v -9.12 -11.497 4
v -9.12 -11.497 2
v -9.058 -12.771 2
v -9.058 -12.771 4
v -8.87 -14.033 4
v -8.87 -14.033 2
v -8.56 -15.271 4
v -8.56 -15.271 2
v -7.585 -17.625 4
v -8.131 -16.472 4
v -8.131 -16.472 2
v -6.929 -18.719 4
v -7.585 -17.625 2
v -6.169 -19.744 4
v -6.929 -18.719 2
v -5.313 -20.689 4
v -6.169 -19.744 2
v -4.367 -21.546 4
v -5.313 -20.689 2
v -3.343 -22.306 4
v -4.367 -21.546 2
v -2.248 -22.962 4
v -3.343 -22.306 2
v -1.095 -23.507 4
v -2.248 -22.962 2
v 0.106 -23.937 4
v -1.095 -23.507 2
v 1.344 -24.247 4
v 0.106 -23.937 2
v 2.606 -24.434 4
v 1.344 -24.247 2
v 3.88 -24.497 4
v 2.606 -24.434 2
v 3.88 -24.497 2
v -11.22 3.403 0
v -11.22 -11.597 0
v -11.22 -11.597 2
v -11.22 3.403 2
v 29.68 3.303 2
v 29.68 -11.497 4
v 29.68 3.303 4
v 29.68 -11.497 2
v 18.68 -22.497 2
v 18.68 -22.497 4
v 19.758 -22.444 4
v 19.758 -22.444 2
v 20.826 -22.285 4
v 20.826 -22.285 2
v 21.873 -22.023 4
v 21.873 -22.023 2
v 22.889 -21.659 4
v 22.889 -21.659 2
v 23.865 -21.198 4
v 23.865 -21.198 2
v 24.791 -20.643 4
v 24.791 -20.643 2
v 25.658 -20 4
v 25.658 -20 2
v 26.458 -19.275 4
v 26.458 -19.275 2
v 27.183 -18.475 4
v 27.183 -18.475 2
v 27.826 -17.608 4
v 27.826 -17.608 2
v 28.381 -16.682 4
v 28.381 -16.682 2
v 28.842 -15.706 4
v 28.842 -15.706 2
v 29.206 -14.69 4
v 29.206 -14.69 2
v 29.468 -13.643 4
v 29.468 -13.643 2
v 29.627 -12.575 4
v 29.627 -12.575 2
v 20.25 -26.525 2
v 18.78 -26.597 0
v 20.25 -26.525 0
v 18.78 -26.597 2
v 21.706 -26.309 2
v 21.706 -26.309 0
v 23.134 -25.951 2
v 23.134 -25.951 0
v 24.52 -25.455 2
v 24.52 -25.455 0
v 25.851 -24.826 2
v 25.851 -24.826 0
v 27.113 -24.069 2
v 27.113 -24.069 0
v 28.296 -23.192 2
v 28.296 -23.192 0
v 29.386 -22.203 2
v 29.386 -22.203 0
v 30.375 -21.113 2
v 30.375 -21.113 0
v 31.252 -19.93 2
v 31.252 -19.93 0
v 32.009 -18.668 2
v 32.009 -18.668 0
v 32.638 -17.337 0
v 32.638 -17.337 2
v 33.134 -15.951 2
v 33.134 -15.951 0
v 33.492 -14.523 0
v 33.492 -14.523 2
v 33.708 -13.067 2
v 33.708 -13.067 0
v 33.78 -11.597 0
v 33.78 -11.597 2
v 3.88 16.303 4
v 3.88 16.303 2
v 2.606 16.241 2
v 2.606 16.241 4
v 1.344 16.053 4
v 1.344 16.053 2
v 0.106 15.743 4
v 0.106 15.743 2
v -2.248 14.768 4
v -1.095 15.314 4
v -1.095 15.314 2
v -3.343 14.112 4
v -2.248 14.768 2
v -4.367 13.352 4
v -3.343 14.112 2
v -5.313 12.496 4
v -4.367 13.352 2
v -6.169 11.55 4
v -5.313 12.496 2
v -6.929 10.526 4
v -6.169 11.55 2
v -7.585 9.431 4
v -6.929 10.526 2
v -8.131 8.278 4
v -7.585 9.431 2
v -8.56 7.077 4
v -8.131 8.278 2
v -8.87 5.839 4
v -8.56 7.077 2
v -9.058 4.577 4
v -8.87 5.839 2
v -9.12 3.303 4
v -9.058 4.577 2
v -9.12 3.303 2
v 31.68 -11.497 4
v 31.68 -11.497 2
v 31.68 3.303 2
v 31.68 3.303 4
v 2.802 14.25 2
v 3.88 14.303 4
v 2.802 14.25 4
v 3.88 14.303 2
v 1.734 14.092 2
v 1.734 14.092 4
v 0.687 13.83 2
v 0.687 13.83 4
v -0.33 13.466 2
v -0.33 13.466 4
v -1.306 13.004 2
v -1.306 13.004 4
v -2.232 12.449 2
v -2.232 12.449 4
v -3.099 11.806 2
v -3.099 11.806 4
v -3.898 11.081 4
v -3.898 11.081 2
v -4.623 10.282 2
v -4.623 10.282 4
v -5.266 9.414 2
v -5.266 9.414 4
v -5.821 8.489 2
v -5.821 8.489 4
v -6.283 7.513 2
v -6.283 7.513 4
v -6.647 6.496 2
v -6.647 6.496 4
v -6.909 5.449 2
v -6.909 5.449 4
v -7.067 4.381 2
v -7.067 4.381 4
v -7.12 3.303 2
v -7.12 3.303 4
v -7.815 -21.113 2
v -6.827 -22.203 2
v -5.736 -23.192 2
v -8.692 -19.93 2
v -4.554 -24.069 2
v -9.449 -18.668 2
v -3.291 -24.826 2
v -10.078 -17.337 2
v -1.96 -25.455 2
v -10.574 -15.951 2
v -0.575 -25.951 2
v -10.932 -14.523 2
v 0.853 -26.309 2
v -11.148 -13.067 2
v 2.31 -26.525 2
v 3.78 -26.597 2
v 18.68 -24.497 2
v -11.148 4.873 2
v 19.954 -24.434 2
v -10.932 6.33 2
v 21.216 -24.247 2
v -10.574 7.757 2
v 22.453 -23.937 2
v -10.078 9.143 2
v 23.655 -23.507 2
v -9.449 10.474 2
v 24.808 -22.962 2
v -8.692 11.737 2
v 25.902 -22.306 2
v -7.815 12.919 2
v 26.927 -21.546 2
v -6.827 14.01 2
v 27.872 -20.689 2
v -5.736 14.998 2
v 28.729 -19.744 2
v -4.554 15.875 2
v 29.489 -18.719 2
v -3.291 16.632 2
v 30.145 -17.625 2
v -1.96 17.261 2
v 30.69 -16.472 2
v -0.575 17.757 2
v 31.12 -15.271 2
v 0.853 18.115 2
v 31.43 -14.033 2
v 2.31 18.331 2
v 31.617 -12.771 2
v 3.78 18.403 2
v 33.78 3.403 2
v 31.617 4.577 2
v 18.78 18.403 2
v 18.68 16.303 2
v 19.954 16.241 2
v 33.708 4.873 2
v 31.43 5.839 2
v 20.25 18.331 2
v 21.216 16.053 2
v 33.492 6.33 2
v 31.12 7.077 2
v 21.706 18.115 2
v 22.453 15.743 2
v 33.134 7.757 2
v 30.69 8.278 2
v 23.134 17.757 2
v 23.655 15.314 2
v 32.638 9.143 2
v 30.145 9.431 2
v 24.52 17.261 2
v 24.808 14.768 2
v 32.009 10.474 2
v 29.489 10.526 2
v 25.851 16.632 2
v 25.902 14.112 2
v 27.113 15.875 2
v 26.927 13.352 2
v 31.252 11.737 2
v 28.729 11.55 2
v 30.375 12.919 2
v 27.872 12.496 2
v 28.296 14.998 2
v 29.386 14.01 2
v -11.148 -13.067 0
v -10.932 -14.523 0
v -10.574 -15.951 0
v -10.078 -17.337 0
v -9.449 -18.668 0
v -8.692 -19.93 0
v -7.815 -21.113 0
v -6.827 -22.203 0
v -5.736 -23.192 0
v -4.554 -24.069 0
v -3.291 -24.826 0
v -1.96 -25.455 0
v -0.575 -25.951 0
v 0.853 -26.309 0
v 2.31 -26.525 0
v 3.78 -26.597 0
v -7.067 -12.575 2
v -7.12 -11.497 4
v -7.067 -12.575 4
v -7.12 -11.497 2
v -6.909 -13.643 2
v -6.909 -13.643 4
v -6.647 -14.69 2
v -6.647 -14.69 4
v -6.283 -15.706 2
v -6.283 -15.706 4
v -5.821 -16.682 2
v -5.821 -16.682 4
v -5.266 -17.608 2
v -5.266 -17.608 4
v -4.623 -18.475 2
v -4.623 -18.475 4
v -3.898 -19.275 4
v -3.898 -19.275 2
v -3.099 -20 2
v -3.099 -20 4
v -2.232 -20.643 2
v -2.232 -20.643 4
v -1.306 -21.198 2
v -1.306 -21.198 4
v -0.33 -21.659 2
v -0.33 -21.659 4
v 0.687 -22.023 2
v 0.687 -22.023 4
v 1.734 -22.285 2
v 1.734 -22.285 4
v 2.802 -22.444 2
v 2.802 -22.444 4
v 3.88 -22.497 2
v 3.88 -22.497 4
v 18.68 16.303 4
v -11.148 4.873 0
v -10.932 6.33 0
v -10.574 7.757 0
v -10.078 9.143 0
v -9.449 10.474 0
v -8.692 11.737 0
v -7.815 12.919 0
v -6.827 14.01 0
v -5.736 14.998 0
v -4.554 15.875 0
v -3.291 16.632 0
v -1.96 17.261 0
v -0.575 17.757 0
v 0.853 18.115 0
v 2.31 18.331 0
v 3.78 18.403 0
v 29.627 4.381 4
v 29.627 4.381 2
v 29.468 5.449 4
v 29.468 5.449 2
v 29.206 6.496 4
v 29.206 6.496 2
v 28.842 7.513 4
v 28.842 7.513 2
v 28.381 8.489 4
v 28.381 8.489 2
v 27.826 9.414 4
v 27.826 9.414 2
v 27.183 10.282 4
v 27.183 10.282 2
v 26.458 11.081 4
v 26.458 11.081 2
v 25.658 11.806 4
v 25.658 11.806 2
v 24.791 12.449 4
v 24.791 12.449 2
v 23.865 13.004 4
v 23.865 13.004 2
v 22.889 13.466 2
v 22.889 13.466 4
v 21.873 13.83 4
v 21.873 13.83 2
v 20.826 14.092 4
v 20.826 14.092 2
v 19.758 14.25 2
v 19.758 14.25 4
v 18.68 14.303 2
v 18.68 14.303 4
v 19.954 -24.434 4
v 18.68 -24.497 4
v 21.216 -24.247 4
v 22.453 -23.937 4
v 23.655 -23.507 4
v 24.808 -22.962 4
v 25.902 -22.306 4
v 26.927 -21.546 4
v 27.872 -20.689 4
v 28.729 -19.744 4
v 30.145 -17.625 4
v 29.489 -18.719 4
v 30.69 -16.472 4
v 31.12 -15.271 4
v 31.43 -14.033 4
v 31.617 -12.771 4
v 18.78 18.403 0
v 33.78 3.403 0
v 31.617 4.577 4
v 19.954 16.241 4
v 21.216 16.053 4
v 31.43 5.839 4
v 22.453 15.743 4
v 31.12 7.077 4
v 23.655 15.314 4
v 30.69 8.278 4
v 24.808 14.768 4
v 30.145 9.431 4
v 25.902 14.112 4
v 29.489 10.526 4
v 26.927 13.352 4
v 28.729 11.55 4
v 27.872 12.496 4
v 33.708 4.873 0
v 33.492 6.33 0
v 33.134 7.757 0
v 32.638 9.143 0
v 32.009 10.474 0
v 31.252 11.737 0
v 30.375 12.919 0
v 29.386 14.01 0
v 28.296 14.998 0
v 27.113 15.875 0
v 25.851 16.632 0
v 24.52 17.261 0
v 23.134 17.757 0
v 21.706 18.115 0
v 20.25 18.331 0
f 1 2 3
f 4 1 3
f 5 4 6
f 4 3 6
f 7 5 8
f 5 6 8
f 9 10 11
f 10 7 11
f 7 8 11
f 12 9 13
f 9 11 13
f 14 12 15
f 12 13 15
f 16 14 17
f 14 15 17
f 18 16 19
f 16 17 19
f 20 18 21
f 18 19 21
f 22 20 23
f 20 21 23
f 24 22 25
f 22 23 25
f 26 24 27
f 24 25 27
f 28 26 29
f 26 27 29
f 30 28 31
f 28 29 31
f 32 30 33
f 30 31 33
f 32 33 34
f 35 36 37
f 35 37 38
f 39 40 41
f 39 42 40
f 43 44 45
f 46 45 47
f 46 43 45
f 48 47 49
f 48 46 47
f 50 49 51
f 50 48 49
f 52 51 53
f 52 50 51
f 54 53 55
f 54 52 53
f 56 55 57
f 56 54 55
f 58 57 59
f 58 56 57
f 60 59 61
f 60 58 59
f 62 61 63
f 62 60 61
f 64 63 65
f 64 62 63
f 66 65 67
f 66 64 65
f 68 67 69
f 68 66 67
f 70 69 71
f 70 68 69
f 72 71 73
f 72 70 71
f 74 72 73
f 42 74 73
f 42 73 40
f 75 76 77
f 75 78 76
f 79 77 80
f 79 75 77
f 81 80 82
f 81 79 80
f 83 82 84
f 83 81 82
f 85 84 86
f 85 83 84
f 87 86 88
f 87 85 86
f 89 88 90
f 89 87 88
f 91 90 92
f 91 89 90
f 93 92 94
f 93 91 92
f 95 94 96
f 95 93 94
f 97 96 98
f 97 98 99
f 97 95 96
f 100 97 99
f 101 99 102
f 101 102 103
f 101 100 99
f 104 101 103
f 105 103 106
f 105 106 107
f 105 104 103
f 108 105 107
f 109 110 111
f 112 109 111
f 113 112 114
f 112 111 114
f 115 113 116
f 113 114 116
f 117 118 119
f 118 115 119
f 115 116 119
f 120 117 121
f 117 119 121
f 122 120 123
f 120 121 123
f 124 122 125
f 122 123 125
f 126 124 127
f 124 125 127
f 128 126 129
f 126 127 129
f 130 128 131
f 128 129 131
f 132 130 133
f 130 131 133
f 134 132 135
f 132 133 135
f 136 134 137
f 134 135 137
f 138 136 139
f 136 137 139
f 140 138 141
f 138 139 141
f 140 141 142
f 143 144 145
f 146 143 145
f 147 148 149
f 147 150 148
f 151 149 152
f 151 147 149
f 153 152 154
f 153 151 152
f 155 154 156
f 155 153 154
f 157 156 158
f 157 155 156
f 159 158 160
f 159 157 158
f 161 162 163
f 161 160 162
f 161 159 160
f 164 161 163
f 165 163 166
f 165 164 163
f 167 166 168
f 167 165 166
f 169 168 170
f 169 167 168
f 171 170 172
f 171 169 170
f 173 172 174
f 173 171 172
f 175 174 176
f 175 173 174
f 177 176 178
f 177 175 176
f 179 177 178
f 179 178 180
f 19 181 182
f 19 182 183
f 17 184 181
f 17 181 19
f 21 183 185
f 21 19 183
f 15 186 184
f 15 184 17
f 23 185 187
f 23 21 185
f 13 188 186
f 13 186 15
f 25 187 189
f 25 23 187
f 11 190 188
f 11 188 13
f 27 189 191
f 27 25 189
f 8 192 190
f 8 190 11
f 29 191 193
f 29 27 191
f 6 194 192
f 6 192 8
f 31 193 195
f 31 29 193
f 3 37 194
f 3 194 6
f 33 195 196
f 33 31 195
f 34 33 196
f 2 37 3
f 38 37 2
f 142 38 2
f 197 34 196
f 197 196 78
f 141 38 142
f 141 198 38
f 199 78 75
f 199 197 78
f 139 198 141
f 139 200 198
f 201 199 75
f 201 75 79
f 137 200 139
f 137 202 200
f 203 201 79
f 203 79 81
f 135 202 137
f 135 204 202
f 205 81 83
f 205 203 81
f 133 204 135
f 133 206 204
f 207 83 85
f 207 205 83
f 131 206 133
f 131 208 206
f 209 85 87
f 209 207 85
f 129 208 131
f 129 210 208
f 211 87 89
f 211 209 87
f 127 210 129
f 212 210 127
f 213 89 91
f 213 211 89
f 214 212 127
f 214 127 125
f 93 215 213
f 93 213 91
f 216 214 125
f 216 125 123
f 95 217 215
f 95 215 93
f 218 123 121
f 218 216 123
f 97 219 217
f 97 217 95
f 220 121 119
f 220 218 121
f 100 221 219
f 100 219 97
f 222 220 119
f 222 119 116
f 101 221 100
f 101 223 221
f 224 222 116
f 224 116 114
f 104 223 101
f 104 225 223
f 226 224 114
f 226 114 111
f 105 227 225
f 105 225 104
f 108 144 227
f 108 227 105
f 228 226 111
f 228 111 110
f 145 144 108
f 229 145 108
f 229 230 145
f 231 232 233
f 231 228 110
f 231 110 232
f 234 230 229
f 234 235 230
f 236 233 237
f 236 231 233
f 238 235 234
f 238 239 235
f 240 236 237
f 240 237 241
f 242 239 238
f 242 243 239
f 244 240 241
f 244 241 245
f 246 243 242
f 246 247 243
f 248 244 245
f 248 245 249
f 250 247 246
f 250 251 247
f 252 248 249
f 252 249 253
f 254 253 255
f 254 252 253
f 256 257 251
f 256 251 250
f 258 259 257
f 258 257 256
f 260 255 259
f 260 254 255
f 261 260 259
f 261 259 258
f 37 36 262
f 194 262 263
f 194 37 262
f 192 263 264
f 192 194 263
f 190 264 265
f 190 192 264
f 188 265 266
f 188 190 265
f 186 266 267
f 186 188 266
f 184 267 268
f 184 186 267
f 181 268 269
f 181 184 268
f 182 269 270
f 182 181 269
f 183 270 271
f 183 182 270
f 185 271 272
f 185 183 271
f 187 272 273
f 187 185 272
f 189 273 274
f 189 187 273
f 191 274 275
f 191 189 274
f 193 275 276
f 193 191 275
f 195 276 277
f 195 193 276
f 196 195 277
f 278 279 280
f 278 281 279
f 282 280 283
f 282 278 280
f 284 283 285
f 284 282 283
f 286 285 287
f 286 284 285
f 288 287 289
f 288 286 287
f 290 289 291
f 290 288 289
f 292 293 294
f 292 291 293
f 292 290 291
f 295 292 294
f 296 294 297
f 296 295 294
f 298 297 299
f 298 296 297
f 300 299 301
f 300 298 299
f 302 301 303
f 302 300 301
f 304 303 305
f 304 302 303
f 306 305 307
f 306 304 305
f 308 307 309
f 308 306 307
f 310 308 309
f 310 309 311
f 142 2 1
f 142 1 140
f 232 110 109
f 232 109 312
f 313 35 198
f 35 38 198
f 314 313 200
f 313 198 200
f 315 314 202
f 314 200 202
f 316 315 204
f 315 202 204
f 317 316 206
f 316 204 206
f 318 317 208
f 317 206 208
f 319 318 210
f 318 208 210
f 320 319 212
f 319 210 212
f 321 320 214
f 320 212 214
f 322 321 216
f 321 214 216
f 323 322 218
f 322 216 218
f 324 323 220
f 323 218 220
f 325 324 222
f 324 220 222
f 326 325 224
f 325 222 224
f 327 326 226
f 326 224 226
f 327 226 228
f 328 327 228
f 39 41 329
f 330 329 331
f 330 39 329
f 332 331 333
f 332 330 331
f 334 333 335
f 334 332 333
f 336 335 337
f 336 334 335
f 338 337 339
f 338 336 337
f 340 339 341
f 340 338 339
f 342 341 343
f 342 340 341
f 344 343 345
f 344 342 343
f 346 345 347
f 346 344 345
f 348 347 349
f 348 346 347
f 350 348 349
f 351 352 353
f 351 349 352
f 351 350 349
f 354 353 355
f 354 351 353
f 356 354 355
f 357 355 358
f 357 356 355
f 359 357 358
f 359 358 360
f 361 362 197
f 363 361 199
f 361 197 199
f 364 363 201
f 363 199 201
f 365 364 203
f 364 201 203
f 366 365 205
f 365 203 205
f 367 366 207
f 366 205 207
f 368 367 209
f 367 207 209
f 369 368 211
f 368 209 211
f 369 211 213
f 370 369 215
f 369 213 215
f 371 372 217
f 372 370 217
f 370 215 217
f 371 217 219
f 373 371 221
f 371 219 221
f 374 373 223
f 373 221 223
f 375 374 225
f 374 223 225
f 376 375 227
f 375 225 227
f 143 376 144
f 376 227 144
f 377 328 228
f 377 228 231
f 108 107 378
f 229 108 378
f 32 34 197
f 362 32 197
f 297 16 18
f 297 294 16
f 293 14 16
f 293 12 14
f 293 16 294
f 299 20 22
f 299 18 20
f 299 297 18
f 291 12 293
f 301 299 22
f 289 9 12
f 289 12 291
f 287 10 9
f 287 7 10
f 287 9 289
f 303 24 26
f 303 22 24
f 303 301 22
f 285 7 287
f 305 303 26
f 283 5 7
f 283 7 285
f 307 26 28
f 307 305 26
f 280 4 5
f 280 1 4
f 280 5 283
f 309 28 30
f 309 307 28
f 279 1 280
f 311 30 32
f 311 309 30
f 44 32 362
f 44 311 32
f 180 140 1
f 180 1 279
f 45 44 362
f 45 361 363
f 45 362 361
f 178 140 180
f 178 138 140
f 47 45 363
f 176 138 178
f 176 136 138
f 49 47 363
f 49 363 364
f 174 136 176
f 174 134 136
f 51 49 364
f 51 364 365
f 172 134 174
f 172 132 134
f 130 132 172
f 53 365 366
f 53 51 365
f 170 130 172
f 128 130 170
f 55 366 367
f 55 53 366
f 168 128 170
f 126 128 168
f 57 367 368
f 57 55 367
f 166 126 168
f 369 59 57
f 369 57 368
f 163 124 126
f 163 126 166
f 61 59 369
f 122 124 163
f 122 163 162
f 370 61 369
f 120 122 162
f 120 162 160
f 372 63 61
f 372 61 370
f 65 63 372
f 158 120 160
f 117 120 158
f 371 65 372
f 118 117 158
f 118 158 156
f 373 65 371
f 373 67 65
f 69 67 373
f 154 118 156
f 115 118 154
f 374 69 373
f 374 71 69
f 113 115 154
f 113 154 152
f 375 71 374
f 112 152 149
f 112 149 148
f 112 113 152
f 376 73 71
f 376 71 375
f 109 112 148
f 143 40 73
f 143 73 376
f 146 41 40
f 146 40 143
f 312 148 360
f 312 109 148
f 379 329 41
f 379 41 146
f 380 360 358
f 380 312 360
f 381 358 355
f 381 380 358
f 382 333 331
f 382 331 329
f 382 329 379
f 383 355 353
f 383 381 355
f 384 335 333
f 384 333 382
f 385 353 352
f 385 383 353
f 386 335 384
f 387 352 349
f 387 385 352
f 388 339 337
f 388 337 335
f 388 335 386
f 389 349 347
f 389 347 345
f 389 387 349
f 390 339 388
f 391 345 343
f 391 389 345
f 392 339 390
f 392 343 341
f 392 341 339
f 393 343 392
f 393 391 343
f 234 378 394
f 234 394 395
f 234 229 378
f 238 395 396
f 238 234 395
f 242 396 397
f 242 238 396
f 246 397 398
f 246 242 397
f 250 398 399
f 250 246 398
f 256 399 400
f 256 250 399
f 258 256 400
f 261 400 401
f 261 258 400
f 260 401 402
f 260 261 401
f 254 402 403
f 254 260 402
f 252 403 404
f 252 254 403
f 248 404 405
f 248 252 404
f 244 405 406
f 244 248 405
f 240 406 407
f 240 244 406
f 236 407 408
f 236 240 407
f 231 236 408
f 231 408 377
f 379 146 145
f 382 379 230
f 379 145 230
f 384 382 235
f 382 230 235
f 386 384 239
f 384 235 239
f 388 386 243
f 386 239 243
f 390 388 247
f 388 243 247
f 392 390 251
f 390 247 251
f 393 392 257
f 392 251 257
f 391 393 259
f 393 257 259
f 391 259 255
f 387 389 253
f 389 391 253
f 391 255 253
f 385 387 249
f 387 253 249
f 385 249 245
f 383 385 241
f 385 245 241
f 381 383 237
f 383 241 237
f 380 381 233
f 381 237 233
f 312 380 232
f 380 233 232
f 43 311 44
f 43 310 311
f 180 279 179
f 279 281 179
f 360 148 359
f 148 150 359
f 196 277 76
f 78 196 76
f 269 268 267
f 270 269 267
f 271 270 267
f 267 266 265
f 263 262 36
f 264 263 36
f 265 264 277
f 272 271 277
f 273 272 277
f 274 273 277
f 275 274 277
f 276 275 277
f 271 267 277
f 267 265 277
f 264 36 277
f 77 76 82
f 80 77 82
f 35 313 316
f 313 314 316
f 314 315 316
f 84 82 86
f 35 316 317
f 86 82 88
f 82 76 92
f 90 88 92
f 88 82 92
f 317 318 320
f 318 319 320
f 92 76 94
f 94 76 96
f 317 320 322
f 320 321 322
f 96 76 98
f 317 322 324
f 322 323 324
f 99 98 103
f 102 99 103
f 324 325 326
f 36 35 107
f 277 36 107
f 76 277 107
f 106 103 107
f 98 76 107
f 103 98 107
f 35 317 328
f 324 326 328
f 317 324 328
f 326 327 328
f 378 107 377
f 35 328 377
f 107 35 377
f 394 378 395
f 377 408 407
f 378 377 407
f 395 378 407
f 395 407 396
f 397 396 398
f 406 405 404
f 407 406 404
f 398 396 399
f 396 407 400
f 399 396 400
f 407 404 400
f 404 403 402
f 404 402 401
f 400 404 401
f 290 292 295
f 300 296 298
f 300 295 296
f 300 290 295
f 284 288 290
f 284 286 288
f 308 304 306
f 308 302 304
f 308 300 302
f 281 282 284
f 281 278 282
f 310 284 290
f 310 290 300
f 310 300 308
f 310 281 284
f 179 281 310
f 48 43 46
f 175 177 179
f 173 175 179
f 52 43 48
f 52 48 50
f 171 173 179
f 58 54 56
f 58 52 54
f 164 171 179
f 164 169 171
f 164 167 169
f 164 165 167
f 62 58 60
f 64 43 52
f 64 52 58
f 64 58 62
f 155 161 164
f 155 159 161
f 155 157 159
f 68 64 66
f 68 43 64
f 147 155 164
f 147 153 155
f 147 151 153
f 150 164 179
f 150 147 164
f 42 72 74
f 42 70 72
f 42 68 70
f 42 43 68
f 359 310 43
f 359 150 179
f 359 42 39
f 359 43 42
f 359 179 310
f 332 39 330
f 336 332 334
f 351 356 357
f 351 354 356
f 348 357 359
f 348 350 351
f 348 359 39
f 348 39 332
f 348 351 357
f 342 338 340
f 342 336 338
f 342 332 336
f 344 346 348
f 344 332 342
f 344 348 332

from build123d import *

# Parameters (mm, degrees)
SKETCH_1_W      = 45
SKETCH_1_H      = 45
EXTRUDE_1_DEPTH = 2
FILLET_1_R      = 15
SKETCH_2_W      = 40.8
SKETCH_2_H      = 40.8
EXTRUDE_2_DEPTH = 2
FILLET_2_R      = 13
SHELL_1_T       = -2


with BuildPart() as part:
    # 스케치1 → 보스-돌출1 (new body)
    with BuildSketch(Plane.XY):
        with Locations((11.279766248, -4.096820809)):
            Rectangle(SKETCH_1_W, SKETCH_1_H)
    extrude(amount=EXTRUDE_1_DEPTH)

    # 필렛1
    fillet_1_edges = [part.edges().sort_by_distance(p)[0] for p in [
        (-11.220233752, 18.403179191, 1),
        (33.779766248, 18.403179191, 1),
        (33.779766248, -26.596820809, 1),
        (-11.220233752, -26.596820809, 1),
    ]]
    fillet(fillet_1_edges, radius=FILLET_1_R)

    # 스케치2 → 보스-돌출2 (add)
    with BuildSketch(Plane.XY.offset(2)):
        with Locations((11.279766248, -4.096820809)):
            Rectangle(SKETCH_2_W, SKETCH_2_H)
    extrude(amount=EXTRUDE_2_DEPTH)

    # 필렛2
    # the kernel refuses this fillet: 13 mm, written as the material it takes off along each edge
    with BuildSketch(Plane(origin=(31.679766248, -24.496820809, 2), x_dir=(0, 1, 0), z_dir=(0, 0, 1)), Plane(origin=(31.679766248, 16.303179191, 2), x_dir=(-1, 0, 0), z_dir=(0, 0, 1))) as fillet_2_piece_1:
        with BuildLine():
            CenterArc((FILLET_2_R, FILLET_2_R), FILLET_2_R, 180, 90)
            Line((0, FILLET_2_R), (0, 0))
            Line((0, 0), (FILLET_2_R, 0))
        make_face()
    extrude(amount=34.5, mode=Mode.SUBTRACT)
    with BuildSketch(Plane(origin=(-9.120233752, 16.303179191, 2), x_dir=(1, 0, 0), z_dir=(0, 0, 1)), Plane(origin=(-9.120233752, -24.496820809, 2), x_dir=(0, 1, 0), z_dir=(0, 0, 1))) as fillet_2_piece_2:
        with BuildLine():
            CenterArc((FILLET_2_R, -FILLET_2_R), FILLET_2_R, 90, 90)
            Line((0, -FILLET_2_R), (0, 0))
            Line((0, 0), (FILLET_2_R, 0))
        make_face()
    extrude(amount=34.5, mode=Mode.SUBTRACT)

    # 쉘1
    shell_1_openings = [part.faces().sort_by_distance(p)[0] for p in [
        (11.279766248, -4.096820809, 4),
    ]]
    offset(amount=SHELL_1_T, openings=shell_1_openings, kind=Kind.INTERSECTION)


solid = part.part
